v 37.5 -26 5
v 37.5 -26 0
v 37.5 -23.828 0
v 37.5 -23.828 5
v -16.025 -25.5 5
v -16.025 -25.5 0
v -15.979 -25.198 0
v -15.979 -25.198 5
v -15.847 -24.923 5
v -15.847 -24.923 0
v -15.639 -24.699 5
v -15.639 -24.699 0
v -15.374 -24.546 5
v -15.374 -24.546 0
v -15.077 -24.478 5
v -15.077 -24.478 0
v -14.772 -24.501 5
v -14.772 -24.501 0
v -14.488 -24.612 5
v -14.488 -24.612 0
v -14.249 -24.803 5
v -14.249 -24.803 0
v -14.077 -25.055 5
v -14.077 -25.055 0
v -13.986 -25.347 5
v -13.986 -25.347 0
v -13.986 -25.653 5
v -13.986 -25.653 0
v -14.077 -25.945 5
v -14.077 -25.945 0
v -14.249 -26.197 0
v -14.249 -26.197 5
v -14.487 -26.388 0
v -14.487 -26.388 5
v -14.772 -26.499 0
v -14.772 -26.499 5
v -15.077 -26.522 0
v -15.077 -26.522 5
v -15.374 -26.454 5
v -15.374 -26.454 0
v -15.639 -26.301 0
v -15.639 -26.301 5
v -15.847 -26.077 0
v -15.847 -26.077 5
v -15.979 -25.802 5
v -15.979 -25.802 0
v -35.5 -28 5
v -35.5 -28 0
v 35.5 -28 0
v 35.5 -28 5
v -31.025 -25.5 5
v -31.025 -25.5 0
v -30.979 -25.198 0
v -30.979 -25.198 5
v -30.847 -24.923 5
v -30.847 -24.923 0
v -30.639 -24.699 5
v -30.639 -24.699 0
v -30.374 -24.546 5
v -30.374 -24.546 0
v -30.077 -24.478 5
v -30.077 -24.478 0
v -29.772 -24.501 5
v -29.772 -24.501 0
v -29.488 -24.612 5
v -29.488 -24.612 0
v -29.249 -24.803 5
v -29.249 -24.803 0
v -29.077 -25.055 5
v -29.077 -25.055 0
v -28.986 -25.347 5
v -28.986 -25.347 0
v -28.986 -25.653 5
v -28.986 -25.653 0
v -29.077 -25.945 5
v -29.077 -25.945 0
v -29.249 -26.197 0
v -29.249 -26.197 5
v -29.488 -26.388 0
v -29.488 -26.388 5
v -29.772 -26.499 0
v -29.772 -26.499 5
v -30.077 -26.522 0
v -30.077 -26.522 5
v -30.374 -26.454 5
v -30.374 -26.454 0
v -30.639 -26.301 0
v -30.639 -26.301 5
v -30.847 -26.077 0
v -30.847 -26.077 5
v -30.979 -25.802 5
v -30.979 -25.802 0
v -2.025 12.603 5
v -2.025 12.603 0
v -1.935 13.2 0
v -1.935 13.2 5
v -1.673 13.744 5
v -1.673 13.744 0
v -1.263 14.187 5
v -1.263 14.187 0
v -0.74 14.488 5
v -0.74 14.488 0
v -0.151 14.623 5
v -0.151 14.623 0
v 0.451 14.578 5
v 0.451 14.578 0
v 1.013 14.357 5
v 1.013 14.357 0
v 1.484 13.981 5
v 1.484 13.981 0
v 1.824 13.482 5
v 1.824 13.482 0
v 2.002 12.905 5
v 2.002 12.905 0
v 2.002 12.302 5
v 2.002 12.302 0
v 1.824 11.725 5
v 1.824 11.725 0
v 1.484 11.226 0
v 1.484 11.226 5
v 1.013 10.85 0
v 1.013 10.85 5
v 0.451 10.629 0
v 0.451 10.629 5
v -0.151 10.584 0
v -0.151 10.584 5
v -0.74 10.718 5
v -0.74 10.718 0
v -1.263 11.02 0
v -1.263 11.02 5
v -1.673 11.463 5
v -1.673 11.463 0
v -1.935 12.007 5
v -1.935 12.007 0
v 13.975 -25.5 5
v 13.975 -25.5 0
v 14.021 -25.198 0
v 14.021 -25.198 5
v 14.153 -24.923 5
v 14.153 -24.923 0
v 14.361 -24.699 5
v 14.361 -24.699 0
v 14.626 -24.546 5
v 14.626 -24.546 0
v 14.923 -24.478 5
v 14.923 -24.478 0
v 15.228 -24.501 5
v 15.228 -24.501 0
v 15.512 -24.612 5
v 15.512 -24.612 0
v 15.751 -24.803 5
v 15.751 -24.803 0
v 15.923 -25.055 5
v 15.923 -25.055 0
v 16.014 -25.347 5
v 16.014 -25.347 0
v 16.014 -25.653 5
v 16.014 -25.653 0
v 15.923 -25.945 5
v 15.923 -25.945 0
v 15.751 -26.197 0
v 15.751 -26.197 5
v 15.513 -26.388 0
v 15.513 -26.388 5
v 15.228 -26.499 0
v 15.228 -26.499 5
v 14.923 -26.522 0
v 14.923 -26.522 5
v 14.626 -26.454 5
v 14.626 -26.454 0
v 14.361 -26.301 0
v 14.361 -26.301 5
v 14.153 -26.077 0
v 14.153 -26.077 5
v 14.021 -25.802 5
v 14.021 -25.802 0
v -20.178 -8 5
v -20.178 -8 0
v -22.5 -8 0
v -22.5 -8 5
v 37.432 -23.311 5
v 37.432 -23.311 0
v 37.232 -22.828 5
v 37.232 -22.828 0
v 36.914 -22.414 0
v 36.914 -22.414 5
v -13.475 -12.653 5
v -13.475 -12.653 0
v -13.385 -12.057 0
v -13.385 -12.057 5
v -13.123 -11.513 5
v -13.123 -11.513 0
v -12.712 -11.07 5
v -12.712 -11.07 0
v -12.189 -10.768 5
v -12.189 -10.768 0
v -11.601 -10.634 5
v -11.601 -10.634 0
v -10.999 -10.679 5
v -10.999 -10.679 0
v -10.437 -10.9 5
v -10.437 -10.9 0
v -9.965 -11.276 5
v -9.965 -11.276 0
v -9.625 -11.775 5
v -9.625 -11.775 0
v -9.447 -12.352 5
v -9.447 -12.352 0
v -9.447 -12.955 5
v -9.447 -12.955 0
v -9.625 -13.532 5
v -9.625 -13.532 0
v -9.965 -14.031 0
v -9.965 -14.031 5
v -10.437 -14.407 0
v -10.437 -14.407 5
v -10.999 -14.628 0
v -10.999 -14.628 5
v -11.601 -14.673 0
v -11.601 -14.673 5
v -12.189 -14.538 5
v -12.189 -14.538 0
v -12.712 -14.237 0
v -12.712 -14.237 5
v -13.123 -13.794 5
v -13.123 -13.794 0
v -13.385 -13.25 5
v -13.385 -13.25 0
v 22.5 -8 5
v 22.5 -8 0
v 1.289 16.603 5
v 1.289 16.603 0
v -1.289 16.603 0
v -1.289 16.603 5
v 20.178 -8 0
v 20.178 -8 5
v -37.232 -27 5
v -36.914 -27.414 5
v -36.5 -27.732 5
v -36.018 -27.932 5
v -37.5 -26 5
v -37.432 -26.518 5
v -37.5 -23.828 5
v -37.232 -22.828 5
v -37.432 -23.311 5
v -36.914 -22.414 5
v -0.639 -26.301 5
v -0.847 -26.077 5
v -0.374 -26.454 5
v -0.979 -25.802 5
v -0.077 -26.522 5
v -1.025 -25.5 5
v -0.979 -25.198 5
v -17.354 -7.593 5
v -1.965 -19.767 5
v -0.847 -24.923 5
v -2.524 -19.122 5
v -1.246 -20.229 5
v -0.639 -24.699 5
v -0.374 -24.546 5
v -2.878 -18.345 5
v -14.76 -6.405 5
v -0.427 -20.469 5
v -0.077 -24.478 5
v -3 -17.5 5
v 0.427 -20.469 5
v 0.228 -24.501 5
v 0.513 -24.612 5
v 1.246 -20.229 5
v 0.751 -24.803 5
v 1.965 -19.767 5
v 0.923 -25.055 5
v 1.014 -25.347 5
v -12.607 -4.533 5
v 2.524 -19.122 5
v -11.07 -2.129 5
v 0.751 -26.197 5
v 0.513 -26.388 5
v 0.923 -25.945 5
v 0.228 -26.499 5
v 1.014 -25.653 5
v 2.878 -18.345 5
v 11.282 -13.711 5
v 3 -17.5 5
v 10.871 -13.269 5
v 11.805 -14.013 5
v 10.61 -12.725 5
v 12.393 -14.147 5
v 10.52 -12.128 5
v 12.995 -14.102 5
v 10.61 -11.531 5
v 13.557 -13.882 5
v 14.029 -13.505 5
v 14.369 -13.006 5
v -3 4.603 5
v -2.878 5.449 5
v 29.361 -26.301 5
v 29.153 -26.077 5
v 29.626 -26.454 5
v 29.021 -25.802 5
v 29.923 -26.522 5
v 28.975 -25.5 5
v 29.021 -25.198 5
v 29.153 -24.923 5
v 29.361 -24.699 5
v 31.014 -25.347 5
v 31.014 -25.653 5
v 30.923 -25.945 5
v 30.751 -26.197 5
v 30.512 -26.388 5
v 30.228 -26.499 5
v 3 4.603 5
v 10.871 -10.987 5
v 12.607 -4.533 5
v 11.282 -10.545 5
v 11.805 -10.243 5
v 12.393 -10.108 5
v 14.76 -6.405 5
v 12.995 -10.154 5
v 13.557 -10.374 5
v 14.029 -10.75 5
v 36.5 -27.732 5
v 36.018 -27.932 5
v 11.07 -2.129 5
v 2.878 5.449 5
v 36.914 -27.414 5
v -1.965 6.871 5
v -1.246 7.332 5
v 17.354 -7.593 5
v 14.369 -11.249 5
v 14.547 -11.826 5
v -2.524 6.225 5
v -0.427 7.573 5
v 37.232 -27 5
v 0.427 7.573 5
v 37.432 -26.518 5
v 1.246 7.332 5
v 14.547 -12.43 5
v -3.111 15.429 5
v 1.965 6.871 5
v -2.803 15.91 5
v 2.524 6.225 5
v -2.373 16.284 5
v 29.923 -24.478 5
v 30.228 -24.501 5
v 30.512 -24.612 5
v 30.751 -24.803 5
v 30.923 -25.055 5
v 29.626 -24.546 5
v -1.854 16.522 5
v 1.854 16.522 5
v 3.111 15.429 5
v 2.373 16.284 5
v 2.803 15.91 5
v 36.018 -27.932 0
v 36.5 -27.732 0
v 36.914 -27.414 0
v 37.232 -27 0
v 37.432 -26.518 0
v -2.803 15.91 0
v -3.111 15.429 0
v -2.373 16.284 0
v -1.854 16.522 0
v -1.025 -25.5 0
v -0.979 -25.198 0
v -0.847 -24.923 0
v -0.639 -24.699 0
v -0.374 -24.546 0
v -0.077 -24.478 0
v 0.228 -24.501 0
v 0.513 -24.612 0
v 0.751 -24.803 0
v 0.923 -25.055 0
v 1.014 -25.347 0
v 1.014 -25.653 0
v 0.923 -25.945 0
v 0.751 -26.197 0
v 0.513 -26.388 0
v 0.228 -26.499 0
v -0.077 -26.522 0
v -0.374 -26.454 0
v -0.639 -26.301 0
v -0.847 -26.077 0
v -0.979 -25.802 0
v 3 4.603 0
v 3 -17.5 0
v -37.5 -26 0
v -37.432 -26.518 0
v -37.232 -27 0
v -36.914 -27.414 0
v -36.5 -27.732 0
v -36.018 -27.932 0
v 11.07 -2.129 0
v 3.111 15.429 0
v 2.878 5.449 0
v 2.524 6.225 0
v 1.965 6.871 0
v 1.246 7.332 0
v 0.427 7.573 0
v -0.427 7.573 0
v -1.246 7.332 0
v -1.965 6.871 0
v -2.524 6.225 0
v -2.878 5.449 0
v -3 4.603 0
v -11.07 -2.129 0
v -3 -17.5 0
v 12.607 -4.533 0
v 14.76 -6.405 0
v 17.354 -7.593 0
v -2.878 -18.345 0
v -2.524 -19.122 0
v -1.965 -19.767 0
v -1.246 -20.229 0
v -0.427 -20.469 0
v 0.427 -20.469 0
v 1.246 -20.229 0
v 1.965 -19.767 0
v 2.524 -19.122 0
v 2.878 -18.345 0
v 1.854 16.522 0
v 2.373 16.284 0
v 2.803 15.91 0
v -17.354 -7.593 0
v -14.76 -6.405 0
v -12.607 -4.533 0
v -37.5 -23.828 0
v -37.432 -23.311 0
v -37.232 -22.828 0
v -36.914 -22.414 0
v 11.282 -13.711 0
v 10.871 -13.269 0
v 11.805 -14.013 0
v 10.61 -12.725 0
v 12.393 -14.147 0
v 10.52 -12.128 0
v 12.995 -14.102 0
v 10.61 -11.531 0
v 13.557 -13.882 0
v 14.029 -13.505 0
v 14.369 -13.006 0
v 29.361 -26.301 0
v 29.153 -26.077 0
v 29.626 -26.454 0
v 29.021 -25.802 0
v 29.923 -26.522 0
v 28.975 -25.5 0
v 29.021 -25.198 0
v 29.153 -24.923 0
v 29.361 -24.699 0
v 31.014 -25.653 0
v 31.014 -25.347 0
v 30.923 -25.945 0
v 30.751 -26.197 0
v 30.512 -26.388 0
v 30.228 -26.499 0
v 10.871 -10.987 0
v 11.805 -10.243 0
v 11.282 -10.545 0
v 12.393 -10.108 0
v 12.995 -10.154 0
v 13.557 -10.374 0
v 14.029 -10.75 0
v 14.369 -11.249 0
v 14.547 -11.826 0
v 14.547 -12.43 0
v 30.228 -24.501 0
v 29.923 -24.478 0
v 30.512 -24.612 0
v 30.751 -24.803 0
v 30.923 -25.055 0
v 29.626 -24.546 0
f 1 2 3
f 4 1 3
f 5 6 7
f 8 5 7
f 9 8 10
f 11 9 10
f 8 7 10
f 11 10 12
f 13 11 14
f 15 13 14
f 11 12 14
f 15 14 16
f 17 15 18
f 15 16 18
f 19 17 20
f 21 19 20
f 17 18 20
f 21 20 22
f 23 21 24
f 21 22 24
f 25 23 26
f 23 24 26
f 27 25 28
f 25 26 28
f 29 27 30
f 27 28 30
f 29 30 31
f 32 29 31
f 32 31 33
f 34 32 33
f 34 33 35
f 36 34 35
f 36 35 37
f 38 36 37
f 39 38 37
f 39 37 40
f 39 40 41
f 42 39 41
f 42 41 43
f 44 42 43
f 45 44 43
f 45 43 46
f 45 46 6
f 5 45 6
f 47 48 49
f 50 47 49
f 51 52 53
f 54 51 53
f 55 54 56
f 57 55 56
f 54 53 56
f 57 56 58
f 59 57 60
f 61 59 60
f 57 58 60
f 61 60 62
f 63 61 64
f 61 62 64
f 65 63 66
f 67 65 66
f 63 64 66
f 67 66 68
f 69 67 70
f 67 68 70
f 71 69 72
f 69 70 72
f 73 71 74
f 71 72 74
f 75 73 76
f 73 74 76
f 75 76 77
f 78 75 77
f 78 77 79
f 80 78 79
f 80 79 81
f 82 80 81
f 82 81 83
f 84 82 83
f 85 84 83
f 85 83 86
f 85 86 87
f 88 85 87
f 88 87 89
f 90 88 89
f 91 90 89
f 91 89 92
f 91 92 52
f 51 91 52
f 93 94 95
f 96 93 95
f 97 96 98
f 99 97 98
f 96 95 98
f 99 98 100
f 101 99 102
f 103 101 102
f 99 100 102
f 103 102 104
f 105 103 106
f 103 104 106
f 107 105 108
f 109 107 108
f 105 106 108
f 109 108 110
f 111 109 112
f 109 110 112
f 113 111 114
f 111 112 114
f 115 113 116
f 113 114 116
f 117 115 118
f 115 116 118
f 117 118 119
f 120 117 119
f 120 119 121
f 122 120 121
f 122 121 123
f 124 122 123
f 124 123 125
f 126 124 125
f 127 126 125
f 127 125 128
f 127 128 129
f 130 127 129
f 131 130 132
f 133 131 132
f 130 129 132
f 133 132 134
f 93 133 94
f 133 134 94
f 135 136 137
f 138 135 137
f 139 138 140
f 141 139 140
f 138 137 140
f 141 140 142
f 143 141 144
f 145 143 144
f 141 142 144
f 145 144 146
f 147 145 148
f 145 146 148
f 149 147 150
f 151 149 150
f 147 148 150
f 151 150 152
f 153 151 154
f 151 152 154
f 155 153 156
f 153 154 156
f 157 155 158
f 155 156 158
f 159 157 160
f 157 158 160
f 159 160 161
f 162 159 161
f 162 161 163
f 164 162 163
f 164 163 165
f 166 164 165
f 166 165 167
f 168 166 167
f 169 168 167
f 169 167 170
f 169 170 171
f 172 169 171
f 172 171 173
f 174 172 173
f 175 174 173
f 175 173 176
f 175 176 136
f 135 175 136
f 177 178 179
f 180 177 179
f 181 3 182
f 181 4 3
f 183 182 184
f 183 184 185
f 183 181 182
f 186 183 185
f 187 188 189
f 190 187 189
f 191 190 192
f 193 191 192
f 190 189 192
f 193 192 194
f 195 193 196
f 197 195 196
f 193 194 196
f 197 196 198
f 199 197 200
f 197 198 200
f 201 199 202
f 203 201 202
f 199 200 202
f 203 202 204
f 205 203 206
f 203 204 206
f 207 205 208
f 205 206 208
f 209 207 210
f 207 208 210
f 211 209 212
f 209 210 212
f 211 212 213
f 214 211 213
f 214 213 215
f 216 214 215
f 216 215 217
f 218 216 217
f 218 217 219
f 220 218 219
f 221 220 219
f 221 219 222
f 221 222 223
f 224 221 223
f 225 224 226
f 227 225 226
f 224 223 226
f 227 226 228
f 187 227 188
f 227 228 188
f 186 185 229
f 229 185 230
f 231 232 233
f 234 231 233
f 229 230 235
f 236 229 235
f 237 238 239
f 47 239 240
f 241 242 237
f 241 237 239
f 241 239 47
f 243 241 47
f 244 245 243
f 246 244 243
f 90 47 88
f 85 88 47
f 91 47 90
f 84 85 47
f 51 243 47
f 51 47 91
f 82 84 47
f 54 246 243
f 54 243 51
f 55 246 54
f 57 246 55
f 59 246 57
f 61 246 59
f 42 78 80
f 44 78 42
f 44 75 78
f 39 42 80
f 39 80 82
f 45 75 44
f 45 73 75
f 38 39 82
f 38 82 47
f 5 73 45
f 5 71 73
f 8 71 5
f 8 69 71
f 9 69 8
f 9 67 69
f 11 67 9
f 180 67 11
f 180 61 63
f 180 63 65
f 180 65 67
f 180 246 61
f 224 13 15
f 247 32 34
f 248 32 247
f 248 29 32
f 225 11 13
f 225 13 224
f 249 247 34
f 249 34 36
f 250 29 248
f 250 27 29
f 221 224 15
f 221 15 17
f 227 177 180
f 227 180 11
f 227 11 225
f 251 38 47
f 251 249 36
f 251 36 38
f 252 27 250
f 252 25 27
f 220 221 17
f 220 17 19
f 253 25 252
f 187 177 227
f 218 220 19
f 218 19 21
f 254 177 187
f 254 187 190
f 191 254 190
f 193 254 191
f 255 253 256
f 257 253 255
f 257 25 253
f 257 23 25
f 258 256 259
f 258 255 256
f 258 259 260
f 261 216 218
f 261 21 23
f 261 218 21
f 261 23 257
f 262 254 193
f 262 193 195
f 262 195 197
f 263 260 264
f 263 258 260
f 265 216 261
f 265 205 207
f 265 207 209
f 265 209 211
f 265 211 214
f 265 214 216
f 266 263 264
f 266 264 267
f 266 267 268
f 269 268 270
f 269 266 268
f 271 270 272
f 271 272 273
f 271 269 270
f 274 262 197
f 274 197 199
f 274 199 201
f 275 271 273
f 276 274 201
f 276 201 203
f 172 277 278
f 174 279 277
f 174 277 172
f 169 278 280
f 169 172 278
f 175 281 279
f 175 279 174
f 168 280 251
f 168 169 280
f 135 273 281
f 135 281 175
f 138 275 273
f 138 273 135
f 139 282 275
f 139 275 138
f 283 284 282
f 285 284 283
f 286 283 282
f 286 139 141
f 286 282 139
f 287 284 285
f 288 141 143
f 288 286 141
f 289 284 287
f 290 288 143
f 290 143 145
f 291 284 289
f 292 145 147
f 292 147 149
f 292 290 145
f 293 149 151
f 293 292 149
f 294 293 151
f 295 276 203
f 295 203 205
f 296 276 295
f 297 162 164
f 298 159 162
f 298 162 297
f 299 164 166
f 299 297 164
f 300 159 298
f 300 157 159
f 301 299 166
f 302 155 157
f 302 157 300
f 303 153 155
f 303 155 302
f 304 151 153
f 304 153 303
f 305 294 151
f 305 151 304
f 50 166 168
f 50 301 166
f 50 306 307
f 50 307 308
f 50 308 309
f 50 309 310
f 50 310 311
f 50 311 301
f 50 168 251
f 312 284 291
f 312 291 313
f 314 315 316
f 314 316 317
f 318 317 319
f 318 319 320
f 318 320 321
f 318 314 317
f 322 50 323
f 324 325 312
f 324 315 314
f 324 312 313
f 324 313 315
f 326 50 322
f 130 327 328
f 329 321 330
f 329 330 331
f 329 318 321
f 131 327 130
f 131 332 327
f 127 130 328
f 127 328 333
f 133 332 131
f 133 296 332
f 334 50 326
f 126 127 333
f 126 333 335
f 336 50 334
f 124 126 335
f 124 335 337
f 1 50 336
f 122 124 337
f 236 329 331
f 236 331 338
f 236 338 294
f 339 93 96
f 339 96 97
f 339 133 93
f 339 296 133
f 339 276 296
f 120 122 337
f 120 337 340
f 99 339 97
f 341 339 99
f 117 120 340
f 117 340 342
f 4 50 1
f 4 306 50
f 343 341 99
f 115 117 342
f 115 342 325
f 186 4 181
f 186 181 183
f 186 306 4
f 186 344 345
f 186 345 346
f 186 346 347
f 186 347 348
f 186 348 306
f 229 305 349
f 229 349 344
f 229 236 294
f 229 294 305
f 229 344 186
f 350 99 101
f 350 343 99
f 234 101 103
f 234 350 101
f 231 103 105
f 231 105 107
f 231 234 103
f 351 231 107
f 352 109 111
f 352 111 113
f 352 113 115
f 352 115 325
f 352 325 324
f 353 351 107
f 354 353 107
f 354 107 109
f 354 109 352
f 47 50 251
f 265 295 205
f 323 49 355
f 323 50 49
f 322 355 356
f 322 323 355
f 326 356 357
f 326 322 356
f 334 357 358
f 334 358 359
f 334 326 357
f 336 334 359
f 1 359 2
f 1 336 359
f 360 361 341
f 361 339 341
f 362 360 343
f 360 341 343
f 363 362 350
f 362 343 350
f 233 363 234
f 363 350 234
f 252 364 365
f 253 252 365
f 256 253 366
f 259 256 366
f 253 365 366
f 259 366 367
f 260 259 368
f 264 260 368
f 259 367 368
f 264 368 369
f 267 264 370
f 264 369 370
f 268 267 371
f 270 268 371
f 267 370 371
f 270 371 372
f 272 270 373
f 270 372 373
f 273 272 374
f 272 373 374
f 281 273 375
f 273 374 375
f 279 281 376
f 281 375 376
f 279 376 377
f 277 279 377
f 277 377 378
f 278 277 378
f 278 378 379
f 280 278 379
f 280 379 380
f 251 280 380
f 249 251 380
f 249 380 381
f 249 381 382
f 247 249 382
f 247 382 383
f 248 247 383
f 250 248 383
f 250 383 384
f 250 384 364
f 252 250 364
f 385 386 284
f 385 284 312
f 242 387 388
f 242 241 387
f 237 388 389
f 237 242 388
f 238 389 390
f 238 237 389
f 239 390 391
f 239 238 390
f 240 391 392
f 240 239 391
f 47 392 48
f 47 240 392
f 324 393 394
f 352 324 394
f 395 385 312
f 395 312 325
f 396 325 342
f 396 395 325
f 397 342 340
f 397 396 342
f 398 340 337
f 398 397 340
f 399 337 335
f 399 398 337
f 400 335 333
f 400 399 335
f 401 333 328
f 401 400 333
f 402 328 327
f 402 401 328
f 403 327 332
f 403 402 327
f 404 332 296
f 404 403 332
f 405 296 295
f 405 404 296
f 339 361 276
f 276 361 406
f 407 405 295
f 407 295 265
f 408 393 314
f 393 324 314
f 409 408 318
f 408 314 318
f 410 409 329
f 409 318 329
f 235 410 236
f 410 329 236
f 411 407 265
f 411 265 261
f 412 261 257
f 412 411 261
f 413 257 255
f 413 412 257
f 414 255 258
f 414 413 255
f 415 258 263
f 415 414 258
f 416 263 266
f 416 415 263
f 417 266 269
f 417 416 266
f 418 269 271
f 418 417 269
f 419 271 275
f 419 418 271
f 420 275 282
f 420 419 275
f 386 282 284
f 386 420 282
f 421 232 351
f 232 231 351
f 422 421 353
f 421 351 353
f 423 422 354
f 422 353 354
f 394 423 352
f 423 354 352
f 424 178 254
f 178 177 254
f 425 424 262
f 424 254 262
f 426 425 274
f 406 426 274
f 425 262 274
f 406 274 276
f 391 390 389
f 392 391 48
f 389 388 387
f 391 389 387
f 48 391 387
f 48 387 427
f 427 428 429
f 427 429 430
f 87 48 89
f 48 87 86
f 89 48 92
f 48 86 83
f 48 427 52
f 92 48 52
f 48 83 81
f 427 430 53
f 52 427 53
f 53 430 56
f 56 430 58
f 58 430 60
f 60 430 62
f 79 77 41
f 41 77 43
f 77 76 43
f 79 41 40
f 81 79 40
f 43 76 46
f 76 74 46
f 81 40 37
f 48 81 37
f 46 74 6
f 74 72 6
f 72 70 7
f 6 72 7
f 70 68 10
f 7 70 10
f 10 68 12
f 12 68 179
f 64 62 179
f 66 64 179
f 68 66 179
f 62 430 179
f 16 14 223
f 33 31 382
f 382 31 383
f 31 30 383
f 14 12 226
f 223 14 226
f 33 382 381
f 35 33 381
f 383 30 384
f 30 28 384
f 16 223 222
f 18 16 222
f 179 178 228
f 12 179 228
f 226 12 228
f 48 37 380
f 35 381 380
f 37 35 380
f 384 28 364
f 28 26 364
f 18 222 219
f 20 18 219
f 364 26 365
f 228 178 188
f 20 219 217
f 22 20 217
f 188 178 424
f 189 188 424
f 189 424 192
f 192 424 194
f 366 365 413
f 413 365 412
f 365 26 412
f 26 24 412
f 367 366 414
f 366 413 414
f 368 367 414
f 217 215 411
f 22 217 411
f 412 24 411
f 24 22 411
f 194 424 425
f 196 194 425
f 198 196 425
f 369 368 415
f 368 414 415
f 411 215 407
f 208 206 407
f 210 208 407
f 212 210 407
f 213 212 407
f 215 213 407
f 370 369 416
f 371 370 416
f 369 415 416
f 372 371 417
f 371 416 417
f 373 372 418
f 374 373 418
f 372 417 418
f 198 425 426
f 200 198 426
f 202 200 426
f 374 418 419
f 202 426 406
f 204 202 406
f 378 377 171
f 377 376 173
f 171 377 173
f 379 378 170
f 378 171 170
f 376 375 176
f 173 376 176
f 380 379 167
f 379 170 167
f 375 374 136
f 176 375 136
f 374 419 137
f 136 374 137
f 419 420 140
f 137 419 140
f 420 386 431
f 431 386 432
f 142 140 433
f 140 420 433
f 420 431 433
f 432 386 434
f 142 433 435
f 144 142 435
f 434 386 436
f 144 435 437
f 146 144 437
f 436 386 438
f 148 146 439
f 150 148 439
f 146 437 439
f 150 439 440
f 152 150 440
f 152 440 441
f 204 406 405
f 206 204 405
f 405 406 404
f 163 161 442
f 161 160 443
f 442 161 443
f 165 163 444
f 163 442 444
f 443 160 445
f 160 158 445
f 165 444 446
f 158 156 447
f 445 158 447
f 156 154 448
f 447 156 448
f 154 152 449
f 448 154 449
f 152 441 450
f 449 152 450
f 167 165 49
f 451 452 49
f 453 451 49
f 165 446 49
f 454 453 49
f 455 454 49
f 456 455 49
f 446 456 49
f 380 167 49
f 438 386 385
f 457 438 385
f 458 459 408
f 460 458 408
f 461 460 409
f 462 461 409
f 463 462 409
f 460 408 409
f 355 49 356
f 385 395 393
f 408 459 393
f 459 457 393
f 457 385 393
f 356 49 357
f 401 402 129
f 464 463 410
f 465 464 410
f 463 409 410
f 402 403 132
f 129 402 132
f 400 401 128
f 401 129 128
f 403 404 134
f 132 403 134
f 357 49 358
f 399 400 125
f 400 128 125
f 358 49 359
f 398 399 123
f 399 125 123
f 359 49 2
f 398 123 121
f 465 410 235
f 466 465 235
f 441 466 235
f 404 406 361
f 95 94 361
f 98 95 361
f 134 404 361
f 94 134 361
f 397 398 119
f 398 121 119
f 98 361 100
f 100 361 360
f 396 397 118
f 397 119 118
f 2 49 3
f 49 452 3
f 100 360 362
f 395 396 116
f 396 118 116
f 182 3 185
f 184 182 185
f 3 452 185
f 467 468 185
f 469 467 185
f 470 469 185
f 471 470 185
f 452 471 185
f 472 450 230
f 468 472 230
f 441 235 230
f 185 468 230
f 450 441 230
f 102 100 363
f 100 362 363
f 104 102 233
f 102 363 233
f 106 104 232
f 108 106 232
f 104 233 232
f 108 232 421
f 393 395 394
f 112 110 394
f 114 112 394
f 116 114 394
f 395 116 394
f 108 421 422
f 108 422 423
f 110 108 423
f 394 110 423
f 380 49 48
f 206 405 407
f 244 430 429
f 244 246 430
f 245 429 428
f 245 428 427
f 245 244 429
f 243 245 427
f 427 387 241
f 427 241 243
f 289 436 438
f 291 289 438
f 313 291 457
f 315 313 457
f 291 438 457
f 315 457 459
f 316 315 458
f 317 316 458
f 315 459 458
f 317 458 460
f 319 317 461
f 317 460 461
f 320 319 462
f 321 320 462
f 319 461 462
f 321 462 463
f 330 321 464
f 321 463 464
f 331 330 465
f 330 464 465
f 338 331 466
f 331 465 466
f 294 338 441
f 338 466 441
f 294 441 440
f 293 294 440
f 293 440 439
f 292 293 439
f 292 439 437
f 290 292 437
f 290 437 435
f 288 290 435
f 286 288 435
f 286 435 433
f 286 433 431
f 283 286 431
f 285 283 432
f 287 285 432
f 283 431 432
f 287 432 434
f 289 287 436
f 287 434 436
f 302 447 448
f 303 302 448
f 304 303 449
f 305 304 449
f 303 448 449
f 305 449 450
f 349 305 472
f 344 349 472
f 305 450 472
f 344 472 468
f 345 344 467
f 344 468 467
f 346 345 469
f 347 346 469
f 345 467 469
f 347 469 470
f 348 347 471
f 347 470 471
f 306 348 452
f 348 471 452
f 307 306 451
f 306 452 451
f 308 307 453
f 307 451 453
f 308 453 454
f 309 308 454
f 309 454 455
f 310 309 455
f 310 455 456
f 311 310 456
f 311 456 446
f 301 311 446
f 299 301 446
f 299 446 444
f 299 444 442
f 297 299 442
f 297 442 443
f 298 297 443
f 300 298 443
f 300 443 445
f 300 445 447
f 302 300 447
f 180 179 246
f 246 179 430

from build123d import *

# Parameters (mm, degrees)
SKETCH_1_W          = 75
SKETCH_1_H          = 56
EXTRUDE_1_DEPTH     = 5
SKETCH_2_R          = 2.025
CUT_EXTRUDE_1_DEPTH = 5
CUT_EXTRUDE_2_DEPTH = 5
FILLET_1_R          = 10
SKETCH_4_R          = 1.025
CUT_EXTRUDE_3_DEPTH = 21.4
CUT_EXTRUDE_4_DEPTH = 81.4
CUT_EXTRUDE_5_DEPTH = 81.4
FILLET_2_R          = 2
FILLET_3_R          = 2


with BuildPart() as part:
    # 草图1 → 凸台-拉伸1 (new body)
    with BuildSketch(Plane.XY):
        Rectangle(SKETCH_1_W, SKETCH_1_H)
    extrude(amount=EXTRUDE_1_DEPTH)

    # 草图2 → 切除-拉伸1 (cut)
    with BuildSketch(Plane(origin=(0, 0, 0), x_dir=(-1, 0, 0), z_dir=(0, 0, -1))):
        with Locations((11.44966442, -12.653381002)):
            Circle(SKETCH_2_R)
        with Locations((0, 12.603403922)):
            Circle(SKETCH_2_R)
        with Locations((-12.544580452, -12.127821306)):
            Circle(SKETCH_2_R)
    extrude(amount=-CUT_EXTRUDE_1_DEPTH, mode=Mode.SUBTRACT)

    # 草图3 → 切除-拉伸2 (cut)
    with BuildSketch(Plane(origin=(0, 0, 0), x_dir=(-1, 0, 0), z_dir=(0, 0, -1))):
        Polygon((2.578504727, 16.603403922), (13.73197178, -8), (37.5, -8), (37.5, 28), (-37.5, 28), (-37.5, -8), (-13.73197178, -8), (-2.578504727, 16.603403922), (0, 16.603403922), align=None)
    extrude(amount=-CUT_EXTRUDE_2_DEPTH, mode=Mode.SUBTRACT)

    # 圆角1
    fillet_1_edges = [part.edges().sort_by_distance(p)[0] for p in [
        (13.73197178, -8, 2.5),
        (-13.73197178, -8, 2.5),
    ]]
    fillet(fillet_1_edges, radius=FILLET_1_R)

    # 草图4 → 切除-拉伸3 (cut)
    with BuildSketch(Plane(origin=(0, 0, 0), x_dir=(-1, 0, 0), z_dir=(0, 0, -1))):
        with Locations((30, -25.5)):
            Circle(SKETCH_4_R)
        with Locations((15, -25.5)):
            Circle(SKETCH_4_R)
        with Locations((0, -25.5)):
            Circle(SKETCH_4_R)
        with Locations((-15, -25.5)):
            Circle(SKETCH_4_R)
        with Locations((-30, -25.5)):
            Circle(SKETCH_4_R)
    extrude(amount=-CUT_EXTRUDE_3_DEPTH, mode=Mode.SUBTRACT)

    # 草图5 → 切除-拉伸4 (cut)
    with BuildSketch(Plane(origin=(0, 0, 0), x_dir=(-1, 0, 0), z_dir=(0, 0, -1))):
        Polygon((-37.5, -23), (-22.5, -8), (-37.5, -8), align=None)
        Polygon((22.5, -8), (37.5, -23), (37.5, -8), align=None)
    extrude(amount=-CUT_EXTRUDE_4_DEPTH, mode=Mode.SUBTRACT)

    # 草图6 → 切除-拉伸5 (cut)
    with BuildSketch(Plane(origin=(0, 0, 0), x_dir=(-1, 0, 0), z_dir=(0, 0, -1))):
        with BuildLine():
            Line((-3, -17.5), (-3, 4.603403922))
            ThreePointArc((-3, 4.603403922), (0, 7.603403922), (3, 4.603403922))
            Line((3, 4.603403922), (3, -17.5))
            ThreePointArc((3, -17.5), (0, -20.5), (-3, -17.5))
        make_face()
    extrude(amount=-CUT_EXTRUDE_5_DEPTH, mode=Mode.SUBTRACT)

    # 圆角2
    fillet_2_edges = [part.edges().sort_by_distance(p)[0] for p in [
        (37.5, -23, 2.5),
        (-37.5, -23, 2.5),
        (37.5, -28, 2.5),
        (-37.5, -28, 2.5),
    ]]
    fillet(fillet_2_edges, radius=FILLET_2_R)

    # 圆角3
    fillet_3_edges = [part.edges().sort_by_distance(p)[0] for p in [
        (-2.578504727, 16.603403922, 2.5),
        (2.578504727, 16.603403922, 2.5),
    ]]
    fillet(fillet_3_edges, radius=FILLET_3_R)


solid = part.part
